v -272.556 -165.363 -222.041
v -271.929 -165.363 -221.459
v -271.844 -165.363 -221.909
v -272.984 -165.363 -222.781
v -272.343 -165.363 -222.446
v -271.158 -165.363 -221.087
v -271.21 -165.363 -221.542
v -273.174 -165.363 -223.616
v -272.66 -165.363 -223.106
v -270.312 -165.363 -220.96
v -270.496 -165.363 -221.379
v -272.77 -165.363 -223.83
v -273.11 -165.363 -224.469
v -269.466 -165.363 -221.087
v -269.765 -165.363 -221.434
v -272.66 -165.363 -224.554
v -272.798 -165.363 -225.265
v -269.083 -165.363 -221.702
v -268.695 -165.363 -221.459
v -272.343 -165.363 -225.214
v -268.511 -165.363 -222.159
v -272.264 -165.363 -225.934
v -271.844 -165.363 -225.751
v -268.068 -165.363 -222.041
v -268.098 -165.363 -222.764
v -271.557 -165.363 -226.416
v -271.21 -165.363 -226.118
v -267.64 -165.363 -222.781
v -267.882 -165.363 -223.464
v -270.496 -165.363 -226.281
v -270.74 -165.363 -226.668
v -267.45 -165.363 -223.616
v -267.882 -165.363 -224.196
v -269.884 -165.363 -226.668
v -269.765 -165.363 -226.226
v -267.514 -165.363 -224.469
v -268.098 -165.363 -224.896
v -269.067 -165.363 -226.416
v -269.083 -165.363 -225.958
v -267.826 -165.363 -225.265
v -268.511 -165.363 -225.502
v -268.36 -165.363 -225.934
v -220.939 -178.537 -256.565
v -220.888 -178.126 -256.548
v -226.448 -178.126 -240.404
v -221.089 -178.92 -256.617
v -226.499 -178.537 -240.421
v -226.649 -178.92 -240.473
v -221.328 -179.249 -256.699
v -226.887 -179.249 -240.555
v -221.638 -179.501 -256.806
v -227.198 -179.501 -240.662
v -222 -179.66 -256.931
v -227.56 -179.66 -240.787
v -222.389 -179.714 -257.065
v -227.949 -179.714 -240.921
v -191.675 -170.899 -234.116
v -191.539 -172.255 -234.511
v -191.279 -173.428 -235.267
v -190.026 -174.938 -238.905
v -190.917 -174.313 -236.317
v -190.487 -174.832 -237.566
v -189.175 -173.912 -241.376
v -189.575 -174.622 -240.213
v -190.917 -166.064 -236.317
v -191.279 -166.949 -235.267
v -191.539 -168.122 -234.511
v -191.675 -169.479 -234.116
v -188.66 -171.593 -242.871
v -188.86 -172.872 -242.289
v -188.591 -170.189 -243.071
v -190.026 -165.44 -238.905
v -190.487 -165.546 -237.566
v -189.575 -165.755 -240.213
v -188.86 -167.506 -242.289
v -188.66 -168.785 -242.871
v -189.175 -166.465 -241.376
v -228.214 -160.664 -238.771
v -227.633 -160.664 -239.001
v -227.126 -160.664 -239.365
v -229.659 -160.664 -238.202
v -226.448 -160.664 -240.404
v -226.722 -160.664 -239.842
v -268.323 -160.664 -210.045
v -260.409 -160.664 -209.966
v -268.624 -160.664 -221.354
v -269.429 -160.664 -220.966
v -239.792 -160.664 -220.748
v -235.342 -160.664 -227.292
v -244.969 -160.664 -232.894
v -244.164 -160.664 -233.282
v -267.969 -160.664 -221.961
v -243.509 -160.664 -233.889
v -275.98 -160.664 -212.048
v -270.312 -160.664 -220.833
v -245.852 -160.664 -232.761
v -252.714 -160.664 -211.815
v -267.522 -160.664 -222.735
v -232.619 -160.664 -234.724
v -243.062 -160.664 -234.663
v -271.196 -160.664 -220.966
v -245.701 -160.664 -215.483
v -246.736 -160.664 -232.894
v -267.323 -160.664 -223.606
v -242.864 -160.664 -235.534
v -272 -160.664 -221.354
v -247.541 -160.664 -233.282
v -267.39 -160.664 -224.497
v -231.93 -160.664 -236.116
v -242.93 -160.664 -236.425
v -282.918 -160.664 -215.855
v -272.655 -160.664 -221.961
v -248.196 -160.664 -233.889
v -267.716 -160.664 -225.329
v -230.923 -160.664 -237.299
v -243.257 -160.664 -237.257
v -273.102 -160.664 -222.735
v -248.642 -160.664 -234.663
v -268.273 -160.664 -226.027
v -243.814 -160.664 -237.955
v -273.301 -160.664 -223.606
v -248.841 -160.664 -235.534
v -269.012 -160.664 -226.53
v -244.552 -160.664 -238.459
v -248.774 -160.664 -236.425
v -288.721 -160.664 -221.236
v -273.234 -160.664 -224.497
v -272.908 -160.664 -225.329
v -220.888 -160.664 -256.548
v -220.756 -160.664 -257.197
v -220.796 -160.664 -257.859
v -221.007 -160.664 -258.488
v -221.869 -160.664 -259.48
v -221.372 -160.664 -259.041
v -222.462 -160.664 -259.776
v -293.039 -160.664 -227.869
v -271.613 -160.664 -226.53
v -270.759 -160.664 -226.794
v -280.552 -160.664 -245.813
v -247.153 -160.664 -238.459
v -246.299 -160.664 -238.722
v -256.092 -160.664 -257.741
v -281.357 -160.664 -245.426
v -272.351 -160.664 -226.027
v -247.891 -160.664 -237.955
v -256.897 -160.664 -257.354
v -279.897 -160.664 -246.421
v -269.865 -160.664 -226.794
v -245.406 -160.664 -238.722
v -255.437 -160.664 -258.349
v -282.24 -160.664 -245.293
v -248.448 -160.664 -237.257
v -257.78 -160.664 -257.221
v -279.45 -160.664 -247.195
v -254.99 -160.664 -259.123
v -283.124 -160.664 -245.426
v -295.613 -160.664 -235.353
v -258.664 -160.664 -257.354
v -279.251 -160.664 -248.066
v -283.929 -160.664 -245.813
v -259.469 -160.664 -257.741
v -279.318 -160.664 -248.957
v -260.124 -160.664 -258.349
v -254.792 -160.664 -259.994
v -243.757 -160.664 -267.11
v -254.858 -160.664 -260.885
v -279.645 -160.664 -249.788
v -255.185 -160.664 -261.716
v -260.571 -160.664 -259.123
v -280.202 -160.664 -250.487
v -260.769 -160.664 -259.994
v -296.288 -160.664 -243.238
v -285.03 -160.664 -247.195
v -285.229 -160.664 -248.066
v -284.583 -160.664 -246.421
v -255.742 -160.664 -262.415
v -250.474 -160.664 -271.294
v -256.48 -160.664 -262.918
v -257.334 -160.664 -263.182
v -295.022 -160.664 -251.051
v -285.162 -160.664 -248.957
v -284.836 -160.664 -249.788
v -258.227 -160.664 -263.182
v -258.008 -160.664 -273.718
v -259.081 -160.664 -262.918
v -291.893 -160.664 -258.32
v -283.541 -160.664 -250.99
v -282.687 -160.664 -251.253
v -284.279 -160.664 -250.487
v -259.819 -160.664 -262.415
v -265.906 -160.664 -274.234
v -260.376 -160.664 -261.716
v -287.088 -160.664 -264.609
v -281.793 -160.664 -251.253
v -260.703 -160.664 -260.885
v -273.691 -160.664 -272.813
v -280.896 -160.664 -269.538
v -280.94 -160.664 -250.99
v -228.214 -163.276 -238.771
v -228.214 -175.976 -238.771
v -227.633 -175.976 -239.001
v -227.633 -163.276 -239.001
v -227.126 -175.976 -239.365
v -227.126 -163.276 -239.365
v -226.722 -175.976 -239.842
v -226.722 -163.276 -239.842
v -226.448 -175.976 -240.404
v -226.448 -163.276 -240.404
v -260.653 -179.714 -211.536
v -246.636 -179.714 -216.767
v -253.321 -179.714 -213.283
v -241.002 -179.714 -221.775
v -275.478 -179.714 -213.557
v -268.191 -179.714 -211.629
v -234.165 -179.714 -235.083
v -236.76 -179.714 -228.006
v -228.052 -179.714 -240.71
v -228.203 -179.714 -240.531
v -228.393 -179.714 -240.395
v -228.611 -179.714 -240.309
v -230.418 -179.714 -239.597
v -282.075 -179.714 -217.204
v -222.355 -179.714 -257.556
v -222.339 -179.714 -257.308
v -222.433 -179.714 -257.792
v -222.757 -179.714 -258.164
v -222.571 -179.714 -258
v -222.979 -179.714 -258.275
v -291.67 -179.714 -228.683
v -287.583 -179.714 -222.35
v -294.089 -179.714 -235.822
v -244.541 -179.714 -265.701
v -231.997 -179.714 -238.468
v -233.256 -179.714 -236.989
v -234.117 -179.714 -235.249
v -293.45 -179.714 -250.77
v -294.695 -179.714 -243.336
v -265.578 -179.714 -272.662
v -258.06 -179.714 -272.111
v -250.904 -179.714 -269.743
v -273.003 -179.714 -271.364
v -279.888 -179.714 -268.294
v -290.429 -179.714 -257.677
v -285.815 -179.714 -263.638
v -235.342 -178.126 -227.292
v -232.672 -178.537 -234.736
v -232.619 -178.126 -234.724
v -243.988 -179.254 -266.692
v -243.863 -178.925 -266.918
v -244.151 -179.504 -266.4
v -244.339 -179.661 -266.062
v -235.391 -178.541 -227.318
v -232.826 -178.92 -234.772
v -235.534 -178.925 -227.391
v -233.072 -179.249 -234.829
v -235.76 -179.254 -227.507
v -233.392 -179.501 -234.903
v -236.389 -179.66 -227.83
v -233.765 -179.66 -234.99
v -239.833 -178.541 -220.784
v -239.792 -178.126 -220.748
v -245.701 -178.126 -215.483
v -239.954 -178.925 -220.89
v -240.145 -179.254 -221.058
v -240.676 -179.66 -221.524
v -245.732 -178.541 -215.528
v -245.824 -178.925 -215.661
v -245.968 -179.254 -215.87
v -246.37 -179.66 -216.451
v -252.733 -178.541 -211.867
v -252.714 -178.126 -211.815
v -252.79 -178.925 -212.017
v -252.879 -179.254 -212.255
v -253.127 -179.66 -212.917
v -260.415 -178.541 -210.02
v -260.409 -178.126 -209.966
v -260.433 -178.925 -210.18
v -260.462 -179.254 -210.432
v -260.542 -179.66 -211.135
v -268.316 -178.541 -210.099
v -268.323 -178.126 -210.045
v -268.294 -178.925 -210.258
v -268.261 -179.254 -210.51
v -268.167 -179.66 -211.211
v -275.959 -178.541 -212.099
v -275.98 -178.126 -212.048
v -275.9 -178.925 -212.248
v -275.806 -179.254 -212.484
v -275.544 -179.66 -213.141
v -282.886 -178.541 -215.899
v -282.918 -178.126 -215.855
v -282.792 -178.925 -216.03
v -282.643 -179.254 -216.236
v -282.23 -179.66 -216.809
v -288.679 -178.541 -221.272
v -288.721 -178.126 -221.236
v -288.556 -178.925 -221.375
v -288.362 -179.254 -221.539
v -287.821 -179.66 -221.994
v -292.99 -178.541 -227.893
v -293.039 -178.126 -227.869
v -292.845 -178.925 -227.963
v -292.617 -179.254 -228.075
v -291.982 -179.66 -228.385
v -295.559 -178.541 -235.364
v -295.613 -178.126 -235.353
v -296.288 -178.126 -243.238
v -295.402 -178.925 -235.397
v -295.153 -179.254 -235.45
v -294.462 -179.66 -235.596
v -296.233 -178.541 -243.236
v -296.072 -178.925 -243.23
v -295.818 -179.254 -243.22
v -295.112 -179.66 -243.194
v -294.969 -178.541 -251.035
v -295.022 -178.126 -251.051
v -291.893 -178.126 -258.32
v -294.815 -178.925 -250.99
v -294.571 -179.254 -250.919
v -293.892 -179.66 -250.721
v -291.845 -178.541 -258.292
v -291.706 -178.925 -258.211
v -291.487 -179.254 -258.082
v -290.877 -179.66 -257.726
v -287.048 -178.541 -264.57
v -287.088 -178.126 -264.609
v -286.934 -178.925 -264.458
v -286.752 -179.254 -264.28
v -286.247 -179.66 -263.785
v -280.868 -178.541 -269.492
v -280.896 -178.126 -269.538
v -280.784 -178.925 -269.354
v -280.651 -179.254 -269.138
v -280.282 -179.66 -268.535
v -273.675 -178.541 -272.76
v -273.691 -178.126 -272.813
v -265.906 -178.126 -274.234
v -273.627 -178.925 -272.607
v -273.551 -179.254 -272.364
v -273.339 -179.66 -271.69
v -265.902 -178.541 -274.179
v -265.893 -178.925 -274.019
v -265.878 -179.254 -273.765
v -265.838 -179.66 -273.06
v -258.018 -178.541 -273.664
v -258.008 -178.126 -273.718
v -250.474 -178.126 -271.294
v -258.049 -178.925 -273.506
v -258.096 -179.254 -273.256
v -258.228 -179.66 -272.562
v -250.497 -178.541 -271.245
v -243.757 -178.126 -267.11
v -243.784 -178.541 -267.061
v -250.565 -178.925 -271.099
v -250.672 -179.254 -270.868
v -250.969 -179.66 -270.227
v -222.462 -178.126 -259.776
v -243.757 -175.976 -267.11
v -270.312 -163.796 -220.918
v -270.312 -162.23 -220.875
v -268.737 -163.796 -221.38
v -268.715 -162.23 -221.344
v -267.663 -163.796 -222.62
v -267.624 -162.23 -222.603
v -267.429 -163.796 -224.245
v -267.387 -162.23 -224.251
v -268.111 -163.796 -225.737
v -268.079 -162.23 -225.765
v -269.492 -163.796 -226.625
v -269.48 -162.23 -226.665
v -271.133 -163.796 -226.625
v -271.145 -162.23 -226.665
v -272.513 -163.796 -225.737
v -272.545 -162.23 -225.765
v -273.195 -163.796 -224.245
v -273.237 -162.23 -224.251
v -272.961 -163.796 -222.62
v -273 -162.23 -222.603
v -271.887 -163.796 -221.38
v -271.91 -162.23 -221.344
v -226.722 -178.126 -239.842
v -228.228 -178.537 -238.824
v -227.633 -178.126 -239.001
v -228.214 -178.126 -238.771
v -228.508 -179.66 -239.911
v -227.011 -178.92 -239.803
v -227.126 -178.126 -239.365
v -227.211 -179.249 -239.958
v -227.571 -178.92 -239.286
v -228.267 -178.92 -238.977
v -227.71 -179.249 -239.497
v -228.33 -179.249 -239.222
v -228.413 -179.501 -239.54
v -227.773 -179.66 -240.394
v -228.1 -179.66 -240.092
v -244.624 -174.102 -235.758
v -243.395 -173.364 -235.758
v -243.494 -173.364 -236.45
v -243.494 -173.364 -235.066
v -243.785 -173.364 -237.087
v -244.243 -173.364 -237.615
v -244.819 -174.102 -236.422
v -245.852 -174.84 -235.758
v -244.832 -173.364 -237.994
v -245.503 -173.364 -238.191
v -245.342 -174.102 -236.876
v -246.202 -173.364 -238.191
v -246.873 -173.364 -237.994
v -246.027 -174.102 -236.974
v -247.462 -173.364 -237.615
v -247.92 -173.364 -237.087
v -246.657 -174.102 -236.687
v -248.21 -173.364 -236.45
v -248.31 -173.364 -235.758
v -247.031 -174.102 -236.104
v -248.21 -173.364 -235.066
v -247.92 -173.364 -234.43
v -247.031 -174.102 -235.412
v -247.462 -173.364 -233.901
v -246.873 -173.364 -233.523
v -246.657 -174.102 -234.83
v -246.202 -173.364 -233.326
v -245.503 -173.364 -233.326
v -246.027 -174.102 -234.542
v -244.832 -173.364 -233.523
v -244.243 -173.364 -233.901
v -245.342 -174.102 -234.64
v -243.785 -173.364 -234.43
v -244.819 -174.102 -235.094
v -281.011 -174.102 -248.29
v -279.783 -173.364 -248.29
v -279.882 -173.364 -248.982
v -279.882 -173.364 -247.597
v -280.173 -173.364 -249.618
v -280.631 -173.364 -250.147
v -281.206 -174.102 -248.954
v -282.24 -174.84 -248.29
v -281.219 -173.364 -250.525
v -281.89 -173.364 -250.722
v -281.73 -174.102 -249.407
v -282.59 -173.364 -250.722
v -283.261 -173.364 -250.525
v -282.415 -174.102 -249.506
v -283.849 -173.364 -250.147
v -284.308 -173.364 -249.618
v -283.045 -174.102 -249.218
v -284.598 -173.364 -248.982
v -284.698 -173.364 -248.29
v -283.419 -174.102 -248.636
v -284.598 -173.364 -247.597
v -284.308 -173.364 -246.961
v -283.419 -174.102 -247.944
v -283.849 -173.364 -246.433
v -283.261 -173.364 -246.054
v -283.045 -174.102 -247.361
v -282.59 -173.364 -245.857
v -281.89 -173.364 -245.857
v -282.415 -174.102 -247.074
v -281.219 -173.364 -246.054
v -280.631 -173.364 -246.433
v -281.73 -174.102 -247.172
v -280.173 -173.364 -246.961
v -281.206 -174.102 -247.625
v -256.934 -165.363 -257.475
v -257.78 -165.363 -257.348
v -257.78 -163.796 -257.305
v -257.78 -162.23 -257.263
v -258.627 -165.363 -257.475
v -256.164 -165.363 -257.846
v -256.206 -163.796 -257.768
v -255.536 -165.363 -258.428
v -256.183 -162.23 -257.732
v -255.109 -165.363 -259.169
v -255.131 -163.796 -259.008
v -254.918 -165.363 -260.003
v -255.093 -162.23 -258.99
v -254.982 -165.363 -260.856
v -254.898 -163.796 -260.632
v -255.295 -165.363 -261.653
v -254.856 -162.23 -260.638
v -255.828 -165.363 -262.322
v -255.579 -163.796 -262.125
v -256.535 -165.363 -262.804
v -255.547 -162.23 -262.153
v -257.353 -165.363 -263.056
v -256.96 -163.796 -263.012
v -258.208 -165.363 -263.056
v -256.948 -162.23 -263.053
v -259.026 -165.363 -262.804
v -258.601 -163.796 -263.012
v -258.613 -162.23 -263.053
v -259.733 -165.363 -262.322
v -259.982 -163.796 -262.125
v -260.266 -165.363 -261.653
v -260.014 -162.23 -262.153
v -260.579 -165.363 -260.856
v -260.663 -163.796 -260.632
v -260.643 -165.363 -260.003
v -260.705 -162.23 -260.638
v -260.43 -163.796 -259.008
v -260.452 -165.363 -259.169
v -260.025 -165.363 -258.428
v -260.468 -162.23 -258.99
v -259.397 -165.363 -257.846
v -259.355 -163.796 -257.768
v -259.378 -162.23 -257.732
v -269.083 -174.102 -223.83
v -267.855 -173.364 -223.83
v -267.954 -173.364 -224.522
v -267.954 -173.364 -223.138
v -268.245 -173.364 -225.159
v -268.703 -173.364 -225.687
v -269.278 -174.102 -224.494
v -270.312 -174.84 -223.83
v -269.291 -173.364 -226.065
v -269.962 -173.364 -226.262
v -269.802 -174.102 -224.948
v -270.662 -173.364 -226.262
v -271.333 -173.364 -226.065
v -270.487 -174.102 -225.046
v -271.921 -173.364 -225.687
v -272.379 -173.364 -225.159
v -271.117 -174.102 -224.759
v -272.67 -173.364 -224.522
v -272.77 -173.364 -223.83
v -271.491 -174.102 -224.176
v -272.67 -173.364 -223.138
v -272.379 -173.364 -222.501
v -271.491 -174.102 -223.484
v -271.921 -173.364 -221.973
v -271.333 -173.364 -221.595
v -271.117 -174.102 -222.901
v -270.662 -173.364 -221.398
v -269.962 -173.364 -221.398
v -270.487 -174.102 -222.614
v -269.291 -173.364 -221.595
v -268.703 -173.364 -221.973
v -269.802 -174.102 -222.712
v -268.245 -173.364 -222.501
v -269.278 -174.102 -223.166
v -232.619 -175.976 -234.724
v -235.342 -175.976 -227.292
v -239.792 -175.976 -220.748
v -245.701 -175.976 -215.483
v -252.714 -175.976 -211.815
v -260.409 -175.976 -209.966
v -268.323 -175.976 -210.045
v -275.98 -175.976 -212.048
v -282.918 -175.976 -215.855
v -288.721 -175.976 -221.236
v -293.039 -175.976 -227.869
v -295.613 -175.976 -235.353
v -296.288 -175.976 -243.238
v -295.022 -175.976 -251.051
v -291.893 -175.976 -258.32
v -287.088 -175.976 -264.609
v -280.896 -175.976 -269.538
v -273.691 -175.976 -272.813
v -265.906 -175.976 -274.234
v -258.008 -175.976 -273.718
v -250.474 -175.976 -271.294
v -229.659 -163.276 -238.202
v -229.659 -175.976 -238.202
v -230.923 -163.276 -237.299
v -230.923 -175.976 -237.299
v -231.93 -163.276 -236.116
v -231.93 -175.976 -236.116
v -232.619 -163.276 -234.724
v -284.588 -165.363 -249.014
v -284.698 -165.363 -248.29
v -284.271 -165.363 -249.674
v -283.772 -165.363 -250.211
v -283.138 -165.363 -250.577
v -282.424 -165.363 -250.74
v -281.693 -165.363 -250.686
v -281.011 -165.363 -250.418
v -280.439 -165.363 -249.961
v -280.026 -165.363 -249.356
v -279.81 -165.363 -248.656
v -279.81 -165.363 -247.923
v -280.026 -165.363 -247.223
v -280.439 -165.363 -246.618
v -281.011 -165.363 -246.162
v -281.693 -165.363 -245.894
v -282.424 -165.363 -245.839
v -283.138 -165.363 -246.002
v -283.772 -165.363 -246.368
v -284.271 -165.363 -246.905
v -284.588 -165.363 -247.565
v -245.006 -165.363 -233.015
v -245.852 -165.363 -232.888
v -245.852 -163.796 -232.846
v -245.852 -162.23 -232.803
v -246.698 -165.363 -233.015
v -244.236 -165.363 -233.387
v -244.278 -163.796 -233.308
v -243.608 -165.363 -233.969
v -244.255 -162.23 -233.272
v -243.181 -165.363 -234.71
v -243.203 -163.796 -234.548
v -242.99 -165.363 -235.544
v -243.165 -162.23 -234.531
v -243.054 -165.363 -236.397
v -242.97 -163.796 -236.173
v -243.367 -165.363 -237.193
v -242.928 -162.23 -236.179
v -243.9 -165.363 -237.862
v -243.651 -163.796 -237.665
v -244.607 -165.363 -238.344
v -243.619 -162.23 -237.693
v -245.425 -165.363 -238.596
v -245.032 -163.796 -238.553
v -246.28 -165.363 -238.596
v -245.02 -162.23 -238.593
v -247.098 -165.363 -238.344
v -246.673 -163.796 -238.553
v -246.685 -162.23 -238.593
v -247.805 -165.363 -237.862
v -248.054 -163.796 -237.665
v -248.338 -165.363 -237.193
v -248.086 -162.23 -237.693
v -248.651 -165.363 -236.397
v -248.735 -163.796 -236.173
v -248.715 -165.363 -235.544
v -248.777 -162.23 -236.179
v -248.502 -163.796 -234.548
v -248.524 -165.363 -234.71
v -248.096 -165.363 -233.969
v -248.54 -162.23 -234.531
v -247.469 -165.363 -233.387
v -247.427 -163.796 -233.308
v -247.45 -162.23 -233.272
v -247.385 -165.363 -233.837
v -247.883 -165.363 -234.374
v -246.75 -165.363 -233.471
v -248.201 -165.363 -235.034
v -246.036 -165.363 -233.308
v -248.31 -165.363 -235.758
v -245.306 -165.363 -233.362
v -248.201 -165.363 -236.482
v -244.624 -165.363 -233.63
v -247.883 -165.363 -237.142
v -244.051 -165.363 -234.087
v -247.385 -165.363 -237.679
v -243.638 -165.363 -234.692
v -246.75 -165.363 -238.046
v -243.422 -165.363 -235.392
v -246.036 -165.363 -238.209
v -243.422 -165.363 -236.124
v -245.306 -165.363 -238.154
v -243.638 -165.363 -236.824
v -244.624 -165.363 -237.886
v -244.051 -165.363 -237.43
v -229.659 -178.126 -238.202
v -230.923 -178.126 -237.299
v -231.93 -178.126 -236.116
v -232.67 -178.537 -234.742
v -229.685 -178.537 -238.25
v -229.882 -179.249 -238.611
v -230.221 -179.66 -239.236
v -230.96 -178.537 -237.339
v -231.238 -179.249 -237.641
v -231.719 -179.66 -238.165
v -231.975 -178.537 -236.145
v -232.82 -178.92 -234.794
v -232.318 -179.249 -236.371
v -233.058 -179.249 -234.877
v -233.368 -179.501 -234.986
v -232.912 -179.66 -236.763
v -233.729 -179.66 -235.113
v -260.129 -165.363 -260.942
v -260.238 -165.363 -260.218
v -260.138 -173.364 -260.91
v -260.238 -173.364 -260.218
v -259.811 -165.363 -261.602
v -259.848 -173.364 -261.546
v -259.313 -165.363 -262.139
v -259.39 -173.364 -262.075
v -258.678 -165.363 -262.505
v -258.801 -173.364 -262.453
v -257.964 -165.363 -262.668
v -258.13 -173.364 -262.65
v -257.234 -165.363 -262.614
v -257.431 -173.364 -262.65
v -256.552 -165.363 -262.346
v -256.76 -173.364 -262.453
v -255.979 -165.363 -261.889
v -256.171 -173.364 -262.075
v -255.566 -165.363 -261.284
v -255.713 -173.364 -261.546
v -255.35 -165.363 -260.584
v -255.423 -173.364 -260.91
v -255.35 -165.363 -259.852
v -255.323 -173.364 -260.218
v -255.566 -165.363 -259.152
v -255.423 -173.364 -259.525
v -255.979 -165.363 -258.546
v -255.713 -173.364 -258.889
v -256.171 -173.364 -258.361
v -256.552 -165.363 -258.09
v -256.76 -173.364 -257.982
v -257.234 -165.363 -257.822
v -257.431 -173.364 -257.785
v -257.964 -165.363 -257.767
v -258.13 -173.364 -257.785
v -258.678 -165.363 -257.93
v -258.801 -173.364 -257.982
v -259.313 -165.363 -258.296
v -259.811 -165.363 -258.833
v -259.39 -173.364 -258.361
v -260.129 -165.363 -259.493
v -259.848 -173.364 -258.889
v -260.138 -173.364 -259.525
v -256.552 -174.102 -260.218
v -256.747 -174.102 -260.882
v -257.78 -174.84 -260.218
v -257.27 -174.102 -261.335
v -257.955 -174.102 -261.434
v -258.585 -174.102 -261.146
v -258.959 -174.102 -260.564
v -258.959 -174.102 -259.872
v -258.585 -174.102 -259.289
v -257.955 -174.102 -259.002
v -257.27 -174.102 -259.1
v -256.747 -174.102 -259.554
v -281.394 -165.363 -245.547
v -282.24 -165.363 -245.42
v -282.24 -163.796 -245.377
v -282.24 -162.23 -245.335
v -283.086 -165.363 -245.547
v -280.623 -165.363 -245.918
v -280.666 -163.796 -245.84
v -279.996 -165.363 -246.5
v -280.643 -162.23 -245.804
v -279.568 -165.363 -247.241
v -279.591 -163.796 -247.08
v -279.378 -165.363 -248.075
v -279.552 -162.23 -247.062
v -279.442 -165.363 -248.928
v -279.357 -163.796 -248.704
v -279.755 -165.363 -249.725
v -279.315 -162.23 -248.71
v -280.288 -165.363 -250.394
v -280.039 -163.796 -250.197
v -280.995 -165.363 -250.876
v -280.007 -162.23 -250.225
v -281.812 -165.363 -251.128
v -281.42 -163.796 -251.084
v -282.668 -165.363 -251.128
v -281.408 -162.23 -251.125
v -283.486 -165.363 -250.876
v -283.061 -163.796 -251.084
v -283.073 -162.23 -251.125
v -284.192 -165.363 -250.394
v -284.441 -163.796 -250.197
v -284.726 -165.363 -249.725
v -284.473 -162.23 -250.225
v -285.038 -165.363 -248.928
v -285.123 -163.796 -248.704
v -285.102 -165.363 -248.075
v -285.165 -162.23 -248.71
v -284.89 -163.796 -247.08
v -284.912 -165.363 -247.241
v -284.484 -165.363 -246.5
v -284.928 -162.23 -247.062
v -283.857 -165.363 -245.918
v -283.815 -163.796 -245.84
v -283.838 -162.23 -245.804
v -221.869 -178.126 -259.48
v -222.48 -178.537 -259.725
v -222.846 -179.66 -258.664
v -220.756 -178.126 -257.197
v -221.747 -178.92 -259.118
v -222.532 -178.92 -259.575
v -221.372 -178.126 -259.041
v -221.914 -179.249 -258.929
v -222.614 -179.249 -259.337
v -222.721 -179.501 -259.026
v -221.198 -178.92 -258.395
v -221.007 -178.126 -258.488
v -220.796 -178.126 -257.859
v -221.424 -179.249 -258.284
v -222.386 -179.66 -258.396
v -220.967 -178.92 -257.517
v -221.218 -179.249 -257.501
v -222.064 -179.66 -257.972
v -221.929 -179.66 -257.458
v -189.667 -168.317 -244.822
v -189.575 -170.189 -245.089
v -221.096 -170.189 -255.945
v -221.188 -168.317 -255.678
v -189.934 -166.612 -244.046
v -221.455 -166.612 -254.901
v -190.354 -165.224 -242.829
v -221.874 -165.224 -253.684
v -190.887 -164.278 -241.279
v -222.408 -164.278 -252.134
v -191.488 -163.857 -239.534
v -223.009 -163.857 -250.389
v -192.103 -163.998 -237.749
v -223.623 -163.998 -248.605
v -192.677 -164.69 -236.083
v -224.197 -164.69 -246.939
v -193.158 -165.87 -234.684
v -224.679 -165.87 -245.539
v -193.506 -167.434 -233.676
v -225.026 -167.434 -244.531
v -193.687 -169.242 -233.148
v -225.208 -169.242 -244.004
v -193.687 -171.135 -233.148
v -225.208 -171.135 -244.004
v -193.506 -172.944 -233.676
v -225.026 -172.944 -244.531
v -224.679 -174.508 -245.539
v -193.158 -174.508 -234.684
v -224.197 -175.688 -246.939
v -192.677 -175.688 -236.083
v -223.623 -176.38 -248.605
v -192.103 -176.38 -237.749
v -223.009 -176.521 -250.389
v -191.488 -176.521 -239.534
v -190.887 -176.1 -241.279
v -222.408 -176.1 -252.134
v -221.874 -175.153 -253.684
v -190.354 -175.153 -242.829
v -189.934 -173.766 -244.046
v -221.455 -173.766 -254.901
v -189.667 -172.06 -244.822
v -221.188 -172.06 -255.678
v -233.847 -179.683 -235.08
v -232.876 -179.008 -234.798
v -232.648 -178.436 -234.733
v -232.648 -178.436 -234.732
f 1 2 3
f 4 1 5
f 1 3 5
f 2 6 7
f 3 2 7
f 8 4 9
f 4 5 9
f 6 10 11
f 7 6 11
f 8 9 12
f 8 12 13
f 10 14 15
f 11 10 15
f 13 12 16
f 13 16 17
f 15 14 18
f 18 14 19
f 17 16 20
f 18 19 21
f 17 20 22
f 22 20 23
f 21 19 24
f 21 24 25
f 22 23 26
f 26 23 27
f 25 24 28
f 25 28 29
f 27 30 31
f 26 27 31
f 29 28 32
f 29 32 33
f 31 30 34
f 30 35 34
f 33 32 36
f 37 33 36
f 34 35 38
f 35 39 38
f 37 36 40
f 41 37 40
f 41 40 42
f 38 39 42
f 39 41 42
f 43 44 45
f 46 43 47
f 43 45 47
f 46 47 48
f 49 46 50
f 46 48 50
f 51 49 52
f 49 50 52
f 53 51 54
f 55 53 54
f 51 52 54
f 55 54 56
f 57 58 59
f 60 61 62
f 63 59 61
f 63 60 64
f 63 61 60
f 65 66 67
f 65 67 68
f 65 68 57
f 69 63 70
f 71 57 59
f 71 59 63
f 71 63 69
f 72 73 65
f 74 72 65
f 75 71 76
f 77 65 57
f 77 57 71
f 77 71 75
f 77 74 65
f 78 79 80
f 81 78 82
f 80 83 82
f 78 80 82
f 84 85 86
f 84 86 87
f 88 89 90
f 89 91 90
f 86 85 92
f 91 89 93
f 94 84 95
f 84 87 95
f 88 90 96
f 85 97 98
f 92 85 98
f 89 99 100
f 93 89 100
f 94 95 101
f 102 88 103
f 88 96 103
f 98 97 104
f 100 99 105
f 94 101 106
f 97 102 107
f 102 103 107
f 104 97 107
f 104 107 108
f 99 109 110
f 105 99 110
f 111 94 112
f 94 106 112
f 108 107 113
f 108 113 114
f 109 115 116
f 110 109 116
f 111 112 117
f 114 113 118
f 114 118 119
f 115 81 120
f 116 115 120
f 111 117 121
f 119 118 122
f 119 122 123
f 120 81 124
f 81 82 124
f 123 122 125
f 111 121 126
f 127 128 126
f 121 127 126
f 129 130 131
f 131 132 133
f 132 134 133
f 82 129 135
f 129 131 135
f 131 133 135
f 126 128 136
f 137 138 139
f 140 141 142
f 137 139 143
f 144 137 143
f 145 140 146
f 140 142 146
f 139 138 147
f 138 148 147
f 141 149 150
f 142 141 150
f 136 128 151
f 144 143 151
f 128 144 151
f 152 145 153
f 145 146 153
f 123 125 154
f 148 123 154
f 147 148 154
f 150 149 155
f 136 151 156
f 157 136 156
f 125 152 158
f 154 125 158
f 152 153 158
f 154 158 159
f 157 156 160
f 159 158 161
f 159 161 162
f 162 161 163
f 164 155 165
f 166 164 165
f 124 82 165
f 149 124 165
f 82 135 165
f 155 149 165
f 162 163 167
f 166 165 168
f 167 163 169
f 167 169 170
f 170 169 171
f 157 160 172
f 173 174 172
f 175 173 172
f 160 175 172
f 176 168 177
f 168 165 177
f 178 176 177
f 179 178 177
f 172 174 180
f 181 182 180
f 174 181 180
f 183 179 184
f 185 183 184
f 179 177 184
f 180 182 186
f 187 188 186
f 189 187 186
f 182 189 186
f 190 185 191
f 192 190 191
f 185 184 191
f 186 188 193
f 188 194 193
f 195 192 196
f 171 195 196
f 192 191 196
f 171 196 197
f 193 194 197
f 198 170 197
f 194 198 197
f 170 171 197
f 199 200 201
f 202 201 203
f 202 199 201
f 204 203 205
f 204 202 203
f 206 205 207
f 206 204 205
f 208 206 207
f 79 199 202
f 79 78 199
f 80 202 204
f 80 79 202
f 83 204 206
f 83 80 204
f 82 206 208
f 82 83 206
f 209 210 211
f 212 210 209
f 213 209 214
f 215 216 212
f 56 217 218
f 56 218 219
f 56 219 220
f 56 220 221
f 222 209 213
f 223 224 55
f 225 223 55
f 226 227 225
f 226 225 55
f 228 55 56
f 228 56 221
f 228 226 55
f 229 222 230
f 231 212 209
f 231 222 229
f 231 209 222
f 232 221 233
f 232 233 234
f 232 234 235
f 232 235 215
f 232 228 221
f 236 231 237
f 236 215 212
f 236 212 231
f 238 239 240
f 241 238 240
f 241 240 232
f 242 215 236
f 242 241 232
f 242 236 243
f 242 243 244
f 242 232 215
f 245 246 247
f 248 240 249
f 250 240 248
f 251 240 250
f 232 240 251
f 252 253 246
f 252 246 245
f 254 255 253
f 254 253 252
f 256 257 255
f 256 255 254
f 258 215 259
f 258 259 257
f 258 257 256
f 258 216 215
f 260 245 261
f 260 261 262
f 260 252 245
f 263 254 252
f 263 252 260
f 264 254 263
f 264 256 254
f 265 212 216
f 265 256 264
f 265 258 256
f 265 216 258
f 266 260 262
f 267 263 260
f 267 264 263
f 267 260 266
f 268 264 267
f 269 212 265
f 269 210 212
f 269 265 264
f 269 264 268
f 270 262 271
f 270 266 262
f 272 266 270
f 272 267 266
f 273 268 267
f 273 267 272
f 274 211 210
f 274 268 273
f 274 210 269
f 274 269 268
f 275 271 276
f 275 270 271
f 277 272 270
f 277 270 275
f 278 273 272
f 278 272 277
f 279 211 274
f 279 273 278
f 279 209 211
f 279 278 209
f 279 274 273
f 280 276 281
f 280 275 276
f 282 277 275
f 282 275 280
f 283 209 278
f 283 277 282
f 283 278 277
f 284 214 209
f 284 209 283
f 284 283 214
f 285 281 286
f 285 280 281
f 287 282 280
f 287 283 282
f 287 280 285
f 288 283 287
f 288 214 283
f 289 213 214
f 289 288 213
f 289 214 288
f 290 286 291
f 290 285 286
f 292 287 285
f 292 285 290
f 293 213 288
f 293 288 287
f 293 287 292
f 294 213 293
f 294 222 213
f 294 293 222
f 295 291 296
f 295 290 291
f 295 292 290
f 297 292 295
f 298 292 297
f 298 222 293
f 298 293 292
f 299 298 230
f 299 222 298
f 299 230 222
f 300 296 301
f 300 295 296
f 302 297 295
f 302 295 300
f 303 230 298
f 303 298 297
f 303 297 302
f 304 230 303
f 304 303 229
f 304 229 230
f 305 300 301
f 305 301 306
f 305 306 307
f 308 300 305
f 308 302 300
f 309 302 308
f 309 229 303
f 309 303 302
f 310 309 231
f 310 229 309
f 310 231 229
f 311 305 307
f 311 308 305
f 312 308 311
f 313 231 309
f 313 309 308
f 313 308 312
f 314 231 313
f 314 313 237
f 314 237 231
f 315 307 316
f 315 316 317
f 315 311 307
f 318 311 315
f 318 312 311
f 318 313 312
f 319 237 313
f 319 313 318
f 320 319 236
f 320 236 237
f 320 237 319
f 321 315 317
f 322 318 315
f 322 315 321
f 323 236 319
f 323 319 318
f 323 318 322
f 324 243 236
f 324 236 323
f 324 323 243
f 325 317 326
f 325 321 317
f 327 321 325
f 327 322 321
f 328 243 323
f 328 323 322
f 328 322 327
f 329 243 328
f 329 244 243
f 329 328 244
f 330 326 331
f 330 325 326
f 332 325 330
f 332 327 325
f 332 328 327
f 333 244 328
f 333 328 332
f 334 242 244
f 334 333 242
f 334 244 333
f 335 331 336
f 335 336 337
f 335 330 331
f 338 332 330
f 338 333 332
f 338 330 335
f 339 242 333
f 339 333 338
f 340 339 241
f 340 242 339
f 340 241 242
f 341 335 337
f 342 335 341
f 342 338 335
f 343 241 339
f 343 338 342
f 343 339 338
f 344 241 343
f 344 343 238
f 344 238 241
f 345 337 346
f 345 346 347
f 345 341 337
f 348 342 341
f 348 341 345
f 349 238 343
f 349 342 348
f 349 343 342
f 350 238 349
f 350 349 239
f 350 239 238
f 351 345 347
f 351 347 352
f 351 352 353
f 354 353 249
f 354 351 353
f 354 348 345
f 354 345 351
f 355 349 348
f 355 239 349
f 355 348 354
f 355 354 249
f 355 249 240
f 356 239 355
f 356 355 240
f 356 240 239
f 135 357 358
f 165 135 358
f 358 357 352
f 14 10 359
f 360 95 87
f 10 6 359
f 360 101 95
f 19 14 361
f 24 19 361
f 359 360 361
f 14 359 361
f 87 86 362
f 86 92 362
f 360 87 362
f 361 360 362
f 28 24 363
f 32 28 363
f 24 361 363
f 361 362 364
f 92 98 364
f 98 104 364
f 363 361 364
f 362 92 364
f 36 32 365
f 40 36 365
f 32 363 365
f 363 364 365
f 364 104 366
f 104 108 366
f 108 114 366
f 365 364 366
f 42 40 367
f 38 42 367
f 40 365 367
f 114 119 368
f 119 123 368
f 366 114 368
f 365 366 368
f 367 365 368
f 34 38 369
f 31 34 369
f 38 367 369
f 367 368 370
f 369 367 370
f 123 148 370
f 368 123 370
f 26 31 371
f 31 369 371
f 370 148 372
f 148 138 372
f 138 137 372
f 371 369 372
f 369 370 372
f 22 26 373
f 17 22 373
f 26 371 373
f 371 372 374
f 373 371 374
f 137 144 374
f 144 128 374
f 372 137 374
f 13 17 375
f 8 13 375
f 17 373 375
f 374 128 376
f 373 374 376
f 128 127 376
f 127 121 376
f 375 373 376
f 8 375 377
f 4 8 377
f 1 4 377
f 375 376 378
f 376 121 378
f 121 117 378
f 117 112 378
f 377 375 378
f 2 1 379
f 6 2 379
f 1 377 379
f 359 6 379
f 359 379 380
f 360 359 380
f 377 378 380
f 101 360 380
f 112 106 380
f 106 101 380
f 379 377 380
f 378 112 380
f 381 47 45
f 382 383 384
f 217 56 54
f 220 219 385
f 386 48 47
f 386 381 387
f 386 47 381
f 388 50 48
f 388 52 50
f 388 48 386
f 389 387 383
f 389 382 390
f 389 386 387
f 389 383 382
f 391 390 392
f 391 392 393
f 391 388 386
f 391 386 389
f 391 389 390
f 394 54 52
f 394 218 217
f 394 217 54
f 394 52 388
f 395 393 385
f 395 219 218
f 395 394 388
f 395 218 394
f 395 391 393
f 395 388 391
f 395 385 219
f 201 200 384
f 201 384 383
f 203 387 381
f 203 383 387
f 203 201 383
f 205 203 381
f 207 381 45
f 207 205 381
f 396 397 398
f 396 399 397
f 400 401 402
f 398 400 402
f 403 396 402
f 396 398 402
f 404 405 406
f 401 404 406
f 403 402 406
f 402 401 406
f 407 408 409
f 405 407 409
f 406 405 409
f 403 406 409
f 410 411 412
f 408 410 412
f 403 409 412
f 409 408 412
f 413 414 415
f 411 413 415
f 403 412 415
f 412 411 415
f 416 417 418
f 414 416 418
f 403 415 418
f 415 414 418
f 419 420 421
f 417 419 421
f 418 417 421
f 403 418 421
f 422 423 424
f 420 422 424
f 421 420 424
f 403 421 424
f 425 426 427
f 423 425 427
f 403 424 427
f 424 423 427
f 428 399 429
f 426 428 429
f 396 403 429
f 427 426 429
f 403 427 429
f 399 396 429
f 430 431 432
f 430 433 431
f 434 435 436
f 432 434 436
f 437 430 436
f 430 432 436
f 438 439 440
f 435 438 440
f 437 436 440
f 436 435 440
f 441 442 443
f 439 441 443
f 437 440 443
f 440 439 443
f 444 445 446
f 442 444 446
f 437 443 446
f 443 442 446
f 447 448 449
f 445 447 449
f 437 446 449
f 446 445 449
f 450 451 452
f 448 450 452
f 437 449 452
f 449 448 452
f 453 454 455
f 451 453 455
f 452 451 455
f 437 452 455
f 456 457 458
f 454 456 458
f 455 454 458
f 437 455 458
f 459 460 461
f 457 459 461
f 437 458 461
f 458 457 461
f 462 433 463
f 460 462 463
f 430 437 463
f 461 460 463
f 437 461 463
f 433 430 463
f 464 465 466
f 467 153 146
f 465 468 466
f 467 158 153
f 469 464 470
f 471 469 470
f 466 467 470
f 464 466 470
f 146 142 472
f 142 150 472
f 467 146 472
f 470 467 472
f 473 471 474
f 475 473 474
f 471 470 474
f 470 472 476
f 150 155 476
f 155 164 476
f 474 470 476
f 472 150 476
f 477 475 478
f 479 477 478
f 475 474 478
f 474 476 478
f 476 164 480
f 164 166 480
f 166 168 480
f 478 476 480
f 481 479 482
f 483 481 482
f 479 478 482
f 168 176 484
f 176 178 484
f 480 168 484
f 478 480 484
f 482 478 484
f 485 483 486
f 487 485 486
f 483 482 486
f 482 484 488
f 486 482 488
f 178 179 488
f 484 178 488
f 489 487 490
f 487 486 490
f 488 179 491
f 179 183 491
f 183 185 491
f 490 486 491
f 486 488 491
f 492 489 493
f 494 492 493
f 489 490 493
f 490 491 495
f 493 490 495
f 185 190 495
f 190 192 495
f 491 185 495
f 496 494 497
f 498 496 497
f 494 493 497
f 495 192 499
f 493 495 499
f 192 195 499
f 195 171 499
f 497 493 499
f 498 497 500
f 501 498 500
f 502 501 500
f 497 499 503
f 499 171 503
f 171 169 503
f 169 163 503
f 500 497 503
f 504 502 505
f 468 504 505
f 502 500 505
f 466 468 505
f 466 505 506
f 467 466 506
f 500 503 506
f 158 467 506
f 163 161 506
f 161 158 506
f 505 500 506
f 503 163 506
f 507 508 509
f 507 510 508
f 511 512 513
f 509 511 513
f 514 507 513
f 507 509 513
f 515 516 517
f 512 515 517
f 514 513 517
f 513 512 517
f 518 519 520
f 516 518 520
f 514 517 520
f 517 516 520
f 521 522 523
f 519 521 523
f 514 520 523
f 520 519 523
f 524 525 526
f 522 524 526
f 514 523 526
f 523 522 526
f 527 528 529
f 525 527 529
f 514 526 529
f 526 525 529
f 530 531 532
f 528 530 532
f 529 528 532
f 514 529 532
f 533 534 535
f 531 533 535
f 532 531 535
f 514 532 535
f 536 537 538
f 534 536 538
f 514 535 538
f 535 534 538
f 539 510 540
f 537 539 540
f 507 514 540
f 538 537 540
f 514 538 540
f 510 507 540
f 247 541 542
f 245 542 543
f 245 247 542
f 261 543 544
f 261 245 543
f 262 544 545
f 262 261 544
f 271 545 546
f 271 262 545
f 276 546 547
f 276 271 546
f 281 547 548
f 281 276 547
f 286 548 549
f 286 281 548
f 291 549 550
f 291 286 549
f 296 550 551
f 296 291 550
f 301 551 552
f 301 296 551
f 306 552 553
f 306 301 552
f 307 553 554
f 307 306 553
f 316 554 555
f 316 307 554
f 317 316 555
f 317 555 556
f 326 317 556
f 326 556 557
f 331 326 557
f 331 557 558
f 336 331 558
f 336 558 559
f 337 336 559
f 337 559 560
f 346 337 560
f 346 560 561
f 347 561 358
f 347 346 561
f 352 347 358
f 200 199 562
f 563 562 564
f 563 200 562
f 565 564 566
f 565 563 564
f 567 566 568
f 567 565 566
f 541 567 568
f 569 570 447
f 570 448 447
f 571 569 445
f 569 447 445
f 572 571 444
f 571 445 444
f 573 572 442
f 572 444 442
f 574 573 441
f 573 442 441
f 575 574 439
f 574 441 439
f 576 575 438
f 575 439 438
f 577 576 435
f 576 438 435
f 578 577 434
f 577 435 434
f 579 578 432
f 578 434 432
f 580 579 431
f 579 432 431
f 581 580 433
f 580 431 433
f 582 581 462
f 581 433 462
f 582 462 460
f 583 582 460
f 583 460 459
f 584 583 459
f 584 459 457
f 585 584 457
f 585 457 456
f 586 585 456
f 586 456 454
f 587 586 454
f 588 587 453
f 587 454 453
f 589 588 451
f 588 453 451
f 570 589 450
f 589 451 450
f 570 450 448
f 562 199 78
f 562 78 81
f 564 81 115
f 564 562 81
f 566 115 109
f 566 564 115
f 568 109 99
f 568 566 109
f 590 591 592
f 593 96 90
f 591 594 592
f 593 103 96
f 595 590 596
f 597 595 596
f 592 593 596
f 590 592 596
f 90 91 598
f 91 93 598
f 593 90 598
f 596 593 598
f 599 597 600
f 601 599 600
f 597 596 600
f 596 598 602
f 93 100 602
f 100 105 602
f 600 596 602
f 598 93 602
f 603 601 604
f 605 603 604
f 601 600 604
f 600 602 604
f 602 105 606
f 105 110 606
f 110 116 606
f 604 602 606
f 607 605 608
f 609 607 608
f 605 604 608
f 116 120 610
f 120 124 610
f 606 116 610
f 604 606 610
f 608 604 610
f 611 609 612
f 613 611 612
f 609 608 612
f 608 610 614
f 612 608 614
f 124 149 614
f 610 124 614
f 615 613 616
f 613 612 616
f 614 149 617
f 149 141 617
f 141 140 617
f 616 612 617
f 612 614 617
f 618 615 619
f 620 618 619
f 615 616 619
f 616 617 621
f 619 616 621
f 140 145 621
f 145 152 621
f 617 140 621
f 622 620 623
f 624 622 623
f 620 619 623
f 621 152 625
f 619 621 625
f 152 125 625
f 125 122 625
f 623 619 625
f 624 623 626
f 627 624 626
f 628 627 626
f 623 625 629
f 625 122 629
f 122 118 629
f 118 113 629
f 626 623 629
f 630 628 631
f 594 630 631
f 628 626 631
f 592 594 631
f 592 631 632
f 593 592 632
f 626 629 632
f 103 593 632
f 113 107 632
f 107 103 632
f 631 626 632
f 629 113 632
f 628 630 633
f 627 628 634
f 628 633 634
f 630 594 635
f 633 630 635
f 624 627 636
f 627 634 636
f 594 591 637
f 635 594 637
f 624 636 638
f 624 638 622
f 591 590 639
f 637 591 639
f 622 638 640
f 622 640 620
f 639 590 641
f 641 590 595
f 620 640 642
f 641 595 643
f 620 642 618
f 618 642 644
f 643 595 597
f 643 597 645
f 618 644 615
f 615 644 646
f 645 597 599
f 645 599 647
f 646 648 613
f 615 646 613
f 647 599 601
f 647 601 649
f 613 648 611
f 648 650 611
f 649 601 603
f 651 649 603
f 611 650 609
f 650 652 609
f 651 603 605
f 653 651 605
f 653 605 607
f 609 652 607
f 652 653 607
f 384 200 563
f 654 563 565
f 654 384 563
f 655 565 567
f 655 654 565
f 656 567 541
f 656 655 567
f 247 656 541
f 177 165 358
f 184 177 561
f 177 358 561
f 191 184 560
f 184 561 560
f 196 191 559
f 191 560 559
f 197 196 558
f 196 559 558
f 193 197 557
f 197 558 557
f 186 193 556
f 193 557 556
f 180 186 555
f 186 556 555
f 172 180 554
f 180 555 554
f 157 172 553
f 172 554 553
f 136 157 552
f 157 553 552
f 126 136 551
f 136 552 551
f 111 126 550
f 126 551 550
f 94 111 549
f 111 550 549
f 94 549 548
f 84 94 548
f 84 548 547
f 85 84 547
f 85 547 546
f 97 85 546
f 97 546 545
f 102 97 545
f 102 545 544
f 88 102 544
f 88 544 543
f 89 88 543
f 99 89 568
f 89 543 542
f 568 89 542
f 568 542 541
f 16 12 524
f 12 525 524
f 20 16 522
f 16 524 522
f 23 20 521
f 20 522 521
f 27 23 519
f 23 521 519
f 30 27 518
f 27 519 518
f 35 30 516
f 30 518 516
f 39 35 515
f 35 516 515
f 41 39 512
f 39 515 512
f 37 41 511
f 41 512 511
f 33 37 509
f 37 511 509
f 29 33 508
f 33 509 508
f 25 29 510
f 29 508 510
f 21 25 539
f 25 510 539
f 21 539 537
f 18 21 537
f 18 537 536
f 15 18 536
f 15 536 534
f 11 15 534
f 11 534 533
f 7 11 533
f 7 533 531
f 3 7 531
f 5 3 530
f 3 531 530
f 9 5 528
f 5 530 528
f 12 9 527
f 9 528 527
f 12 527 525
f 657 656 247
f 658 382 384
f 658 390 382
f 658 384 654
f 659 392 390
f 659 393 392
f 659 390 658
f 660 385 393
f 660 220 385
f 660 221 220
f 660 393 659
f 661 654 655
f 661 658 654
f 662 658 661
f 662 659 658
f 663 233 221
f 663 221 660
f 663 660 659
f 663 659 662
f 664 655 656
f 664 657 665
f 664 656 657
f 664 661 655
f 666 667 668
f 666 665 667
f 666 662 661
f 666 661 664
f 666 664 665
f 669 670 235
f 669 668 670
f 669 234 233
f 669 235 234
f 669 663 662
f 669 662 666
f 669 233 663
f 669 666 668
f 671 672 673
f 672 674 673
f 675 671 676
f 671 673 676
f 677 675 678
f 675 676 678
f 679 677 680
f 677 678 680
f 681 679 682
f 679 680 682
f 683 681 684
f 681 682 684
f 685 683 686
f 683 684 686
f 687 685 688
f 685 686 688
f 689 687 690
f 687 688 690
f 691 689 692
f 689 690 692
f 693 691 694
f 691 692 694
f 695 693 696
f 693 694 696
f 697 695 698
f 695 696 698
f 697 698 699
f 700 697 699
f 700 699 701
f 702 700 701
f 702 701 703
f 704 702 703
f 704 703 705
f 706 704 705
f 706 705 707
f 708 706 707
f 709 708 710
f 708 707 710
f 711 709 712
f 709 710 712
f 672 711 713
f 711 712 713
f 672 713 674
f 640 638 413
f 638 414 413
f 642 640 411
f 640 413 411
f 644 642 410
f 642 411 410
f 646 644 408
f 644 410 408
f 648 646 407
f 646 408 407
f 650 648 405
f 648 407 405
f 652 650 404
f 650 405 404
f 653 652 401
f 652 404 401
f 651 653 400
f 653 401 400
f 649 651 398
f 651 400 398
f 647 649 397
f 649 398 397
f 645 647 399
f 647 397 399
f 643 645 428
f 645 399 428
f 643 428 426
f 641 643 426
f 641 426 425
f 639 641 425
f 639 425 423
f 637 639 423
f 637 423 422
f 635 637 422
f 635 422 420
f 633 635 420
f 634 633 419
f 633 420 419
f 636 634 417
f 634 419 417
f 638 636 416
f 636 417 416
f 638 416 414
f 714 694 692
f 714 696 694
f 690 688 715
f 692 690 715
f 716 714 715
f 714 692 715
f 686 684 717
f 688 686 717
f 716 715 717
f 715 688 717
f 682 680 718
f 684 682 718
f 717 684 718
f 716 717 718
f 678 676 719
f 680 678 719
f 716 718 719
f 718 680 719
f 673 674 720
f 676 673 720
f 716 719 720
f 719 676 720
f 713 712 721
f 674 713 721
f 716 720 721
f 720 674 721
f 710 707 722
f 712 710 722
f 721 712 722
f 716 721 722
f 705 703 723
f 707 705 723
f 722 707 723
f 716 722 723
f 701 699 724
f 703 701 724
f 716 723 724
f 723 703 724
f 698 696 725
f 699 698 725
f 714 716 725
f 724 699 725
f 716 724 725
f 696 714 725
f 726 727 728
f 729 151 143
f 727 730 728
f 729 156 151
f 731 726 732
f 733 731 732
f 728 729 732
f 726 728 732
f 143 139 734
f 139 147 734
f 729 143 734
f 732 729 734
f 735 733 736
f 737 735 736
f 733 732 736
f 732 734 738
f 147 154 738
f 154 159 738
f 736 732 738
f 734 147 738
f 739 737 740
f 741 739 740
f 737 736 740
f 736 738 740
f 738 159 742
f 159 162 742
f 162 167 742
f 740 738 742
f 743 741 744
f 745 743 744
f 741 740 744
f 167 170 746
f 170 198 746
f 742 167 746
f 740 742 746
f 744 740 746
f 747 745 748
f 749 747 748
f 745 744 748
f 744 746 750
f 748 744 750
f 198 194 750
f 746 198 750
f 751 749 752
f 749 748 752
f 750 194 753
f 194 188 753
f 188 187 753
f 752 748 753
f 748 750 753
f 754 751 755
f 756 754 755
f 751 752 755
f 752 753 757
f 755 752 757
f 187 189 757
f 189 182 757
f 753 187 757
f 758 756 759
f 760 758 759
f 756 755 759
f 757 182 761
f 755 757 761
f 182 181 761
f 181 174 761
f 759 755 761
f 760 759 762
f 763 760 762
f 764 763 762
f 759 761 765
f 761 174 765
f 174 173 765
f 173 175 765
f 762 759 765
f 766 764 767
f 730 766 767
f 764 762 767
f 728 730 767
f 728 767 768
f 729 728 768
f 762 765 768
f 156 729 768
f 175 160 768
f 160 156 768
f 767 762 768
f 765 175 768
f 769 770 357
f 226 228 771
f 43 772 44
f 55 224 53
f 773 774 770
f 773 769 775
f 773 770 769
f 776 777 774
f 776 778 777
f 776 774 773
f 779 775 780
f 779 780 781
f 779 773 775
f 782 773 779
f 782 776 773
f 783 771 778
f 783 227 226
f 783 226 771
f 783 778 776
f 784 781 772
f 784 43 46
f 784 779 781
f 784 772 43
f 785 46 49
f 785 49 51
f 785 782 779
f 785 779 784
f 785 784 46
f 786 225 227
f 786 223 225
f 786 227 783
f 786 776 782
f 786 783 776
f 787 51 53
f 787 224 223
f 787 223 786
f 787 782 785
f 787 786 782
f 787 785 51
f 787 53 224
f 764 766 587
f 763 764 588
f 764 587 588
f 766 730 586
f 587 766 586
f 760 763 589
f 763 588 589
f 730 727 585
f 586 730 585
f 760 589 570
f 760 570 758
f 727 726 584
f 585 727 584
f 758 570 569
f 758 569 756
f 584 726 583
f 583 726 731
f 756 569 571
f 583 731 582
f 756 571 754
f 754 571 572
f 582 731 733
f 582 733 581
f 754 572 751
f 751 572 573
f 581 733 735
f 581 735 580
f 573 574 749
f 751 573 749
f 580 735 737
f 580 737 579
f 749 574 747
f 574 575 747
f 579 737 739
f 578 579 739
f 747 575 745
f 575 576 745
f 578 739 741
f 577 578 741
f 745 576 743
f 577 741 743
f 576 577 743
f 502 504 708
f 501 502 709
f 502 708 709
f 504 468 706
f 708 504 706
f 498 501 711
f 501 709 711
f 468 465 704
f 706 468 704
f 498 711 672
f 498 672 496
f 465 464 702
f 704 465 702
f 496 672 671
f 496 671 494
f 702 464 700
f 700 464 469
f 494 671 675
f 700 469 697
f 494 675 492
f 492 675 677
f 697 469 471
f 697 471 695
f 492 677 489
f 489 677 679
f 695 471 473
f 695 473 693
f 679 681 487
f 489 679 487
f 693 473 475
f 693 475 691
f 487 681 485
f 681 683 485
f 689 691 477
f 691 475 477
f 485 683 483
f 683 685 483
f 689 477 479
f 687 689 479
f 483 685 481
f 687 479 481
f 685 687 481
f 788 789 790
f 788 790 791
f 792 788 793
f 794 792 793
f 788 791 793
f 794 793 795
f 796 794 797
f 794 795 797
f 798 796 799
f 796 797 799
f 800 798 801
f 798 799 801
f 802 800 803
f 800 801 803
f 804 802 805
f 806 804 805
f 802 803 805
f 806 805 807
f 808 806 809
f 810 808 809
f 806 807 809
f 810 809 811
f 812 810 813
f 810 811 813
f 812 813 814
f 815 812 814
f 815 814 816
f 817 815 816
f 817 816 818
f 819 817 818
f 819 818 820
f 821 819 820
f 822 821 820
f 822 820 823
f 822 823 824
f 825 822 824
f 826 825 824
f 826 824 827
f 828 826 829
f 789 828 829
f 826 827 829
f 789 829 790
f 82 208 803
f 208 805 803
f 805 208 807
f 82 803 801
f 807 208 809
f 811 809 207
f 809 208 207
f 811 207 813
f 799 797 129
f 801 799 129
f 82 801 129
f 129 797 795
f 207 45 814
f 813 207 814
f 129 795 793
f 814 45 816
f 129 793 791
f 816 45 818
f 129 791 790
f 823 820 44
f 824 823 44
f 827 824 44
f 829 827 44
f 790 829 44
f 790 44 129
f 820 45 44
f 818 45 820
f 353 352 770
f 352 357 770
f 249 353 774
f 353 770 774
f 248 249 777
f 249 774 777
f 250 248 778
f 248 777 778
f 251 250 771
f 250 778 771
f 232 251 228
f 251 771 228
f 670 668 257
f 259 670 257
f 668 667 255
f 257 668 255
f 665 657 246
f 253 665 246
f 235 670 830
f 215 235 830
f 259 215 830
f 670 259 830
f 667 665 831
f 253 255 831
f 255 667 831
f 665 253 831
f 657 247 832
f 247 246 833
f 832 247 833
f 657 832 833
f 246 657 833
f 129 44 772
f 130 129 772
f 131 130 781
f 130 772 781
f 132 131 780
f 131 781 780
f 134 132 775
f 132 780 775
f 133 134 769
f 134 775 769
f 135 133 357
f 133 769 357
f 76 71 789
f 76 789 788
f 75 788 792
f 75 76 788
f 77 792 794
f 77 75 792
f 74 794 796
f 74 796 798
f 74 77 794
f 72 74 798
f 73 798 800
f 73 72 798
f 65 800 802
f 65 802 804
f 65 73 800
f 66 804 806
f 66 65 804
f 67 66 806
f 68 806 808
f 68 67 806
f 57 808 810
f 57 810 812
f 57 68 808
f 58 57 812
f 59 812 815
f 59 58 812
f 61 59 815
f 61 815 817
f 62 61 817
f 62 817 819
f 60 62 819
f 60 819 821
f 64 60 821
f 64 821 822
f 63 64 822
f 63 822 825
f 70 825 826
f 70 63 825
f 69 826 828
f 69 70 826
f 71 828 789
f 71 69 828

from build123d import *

# Parameters (mm, degrees)
STOCK_REFERENCE_START            = -175.975505736
STOCK_REFERENCE_SEAT_1_OUTLINE_R = 32.264078684
STOCK_REFERENCE_SEAT_1_DEPTH     = 15.311729992
STOCK_REFERENCE_SEAT_1_2_DEPTH   = 12.7
BOSS_EXTRUDE3_START              = 3.738270008
BOSS_EXTRUDE3_DEPTH              = 3.738270008
BOSS_EXTRUDE1_DEPTH              = 2.611729992
SKETCH2_R                        = 6.35
BOSS_EXTRUDE2_DEPTH              = 34.925
CHAMFER1_SIZE                    = 1.5875
FILLET1_R                        = 6.35
FILLET2_R                        = 2.54
FILLET3_R                        = 1.5875
HOLE1_AT_2_COUNT                 = 2
HOLE1_AT_2_PITCH                 = 27.213140303
HOLE1_AT_3_COUNT                 = 2
HOLE1_AT_3_PITCH                 = 38.485192091
HOLE1_AT_4_COUNT                 = 2
HOLE1_AT_4_PITCH                 = 27.213140303
F_8_CLEARANCE_HOLE1_D            = 4.9149
F_8_CLEARANCE_HOLE1_DEPTH        = 12.7
F_8_CLEARANCE_HOLE1_TIP          = 1.476584928


# Read off the part's stored shape, not the designer's step: Stock-Reference Seat-1
with BuildPart() as part:
    # Stock-Reference Seat-1 outline → Stock-Reference Seat-1 (new body)
    with BuildSketch(Plane(origin=(0, 0, 0), x_dir=(1, 0, 0), z_dir=(0, 1, 0)).offset(STOCK_REFERENCE_START)):
        with Locations((-264.046286299, 242.023928087)):
            Circle(STOCK_REFERENCE_SEAT_1_OUTLINE_R)
    extrude(amount=STOCK_REFERENCE_SEAT_1_DEPTH)

    # Stock-Reference Seat-1 2 outline → Stock-Reference Seat-1 2 (add)
    with BuildSketch(Plane(origin=(0, 0, 0), x_dir=(1, 0, 0), z_dir=(0, 1, 0)).offset(STOCK_REFERENCE_START)):
        with BuildLine():
            ThreePointArc((-243.756619182, 267.109784294), (-233.536149053, 252.516892329), (-232.618762484, 234.724508918))
            Line((-232.618762484, 234.724508918), (-230.711355396, 240.263016846))
            Line((-230.711355396, 240.263016846), (-226.943146121, 238.965283021))
            Line((-226.943146121, 238.965283021), (-220.060881103, 258.949207593))
            Line((-220.060881103, 258.949207593), (-243.756619182, 267.109784294))
        make_face()
    extrude(amount=STOCK_REFERENCE_SEAT_1_2_DEPTH)

    # Sketch7 → Boss-Extrude3 (add)
    with BuildSketch(Plane.XZ.offset(175.975505736).offset(BOSS_EXTRUDE3_START)):
        with BuildLine():
            Line((-243.756619182, -267.109784294), (-220.060881103, -258.949207593))
            Line((-220.060881103, -258.949207593), (-226.943146121, -238.965283021))
            Line((-226.943146121, -238.965283021), (-230.711355396, -240.263016846))
            Line((-230.711355396, -240.263016846), (-232.618762484, -234.724508918))
            ThreePointArc((-232.618762484, -234.724508918), (-294.556423545, -231.530963846), (-243.756619182, -267.109784294))
        make_face()
    extrude(amount=-BOSS_EXTRUDE3_DEPTH)

    # Sketch1 → Boss-Extrude1 (add)
    with BuildSketch(Plane(origin=(0, -163.275505736, 0), x_dir=(1, 0, 0), z_dir=(0, 1, 0))):
        with BuildLine():
            Line((-232.618762484, 234.724508918), (-230.711355396, 240.263016846))
            Line((-230.711355396, 240.263016846), (-226.943146121, 238.965283021))
            Line((-226.943146121, 238.965283021), (-220.060881103, 258.949207593))
            Line((-220.060881103, 258.949207593), (-243.756619182, 267.109784294))
            ThreePointArc((-243.756619182, 267.109784294), (-233.536149053, 252.516892329), (-232.618762484, 234.724508918))
        make_face()
    extrude(amount=BOSS_EXTRUDE1_DEPTH)

    # Sketch2 → Boss-Extrude2 (add)
    with BuildSketch(Plane(origin=(-276.451963722, 0, -95.207308867), x_dir=(0.325620940566074, 0, -0.9455003982362278), z_dir=(0.9455003982362278, 0, 0.32562094056607405))):
        with Locations((163.652309847, -170.188775744)):
            Circle(SKETCH2_R)
    extrude(amount=BOSS_EXTRUDE2_DEPTH)

    # Chamfer1
    chamfer1_edges = [part.edges().sort_by_distance(p)[0] for p in [
        (-192.209436228, -170.188775744, -232.564394121),
    ]]
    chamfer(chamfer1_edges, length=CHAMFER1_SIZE)

    # Fillet1
    # the kernel refuses this fillet: 6.35 mm, written as the material it adds along each edge
    with BuildSketch(Plane(origin=(-230.711355396, -175.975505736, -240.263016846), x_dir=(0.9455003982389363, 0, 0.3256209405582093), z_dir=(0, 1, 0))) as fillet1_piece_1:
        with BuildLine():
            CenterArc((6.349999999, -5.893320524), FILLET1_R, 111.862223466, 68.137776529)
            Line((-1e-09, -5.893320524), (-0.127000001, -5.893320524))
            Line((-0.127000001, -5.893320524), (-0.127, 0))
            Line((-0.127, 0), (0, 0.127))
            ThreePointArc((0, 0.127), (1.992706339, 0.127), (3.938120932, 0.11786641))
            Line((3.938120932, 0.11786641), (3.985412679, 0))
        make_face()
    extrude(amount=12.7)
    with BuildSketch(Plane(origin=(-230.711355396, -179.713775744, -240.263016846), x_dir=(0.9455003982362268, 0, 0.3256209405660767), z_dir=(0, 1, 0))) as fillet1_piece_2:
        with BuildLine():
            CenterArc((6.35, -5.893320524), FILLET1_R, 111.862223465, 68.137776535)
            Line((0, -5.893320524), (-0.127, -5.893320524))
            Line((-0.127, -5.893320524), (-0.127, 0))
            Line((-0.127, 0), (0, 0.127))
            ThreePointArc((0, 0.127), (1.99270634, 0.127), (3.938120933, 0.11786641))
            Line((3.938120933, 0.11786641), (3.98541268, 0))
        make_face()
    extrude(amount=3.738270008)
    with BuildSketch(Plane(origin=(-230.711355396, -163.275505736, -240.263016846), x_dir=(0.9455003982362268, 0, 0.3256209405660767), z_dir=(0, 1, 0))) as fillet1_piece_3:
        with BuildLine():
            CenterArc((6.35, -5.893320524), FILLET1_R, 111.862223465, 68.137776535)
            Line((0, -5.893320524), (-0.127, -5.893320524))
            Line((-0.127, -5.893320524), (-0.127, 0))
            Line((-0.127, 0), (0, 0.127))
            ThreePointArc((0, 0.127), (1.99270634, 0.127), (3.938120933, 0.11786641))
            Line((3.938120933, 0.11786641), (3.98541268, 0))
        make_face()
    extrude(amount=2.611729992)

    # Fillet2
    fillet2_edges = [part.edges().sort_by_distance(p)[0] for p in [
        (-226.943146121, -169.625505736, -238.965283021),
        (-220.060881103, -169.625505736, -258.949207593),
    ]]
    fillet(fillet2_edges, radius=FILLET2_R)

    # Fillet3
    fillet3_edges = [part.edges().sort_by_distance(p)[0] for p in [
        (-233.109535648, -179.713775744, -263.443034538),
        (-294.55657248, -179.713775744, -231.531396911),
        (-223.667862866, -179.713775744, -248.475671438),
        (-230.923127248, -179.713775744, -237.298737872),
        (-227.125556964, -179.713775744, -239.36526013),
        (-221.006530266, -179.713775744, -258.488049029),
    ]]
    fillet(fillet3_edges, radius=FILLET3_R)

    # Sketch4 → Hole1 (revolve, cut)
    with BuildSketch(Plane(origin=(-245.852404075, -160.663775744, -235.758135864), x_dir=(0, 0, 1), z_dir=(1, 0, 0))):
        Polygon((0, 0), (0, 4.699), (2.8702, 4.699), (2.9972, 0), align=None)
    hole1 = revolve(axis=Axis((-245.852404075, -270.663775744, -235.758135864), (0, 1, 0)), mode=Mode.SUBTRACT)

    # Hole1 at 2: Hole1 ×2
    with Locations(*[Vector(-0.8988185183780313, 0, 0.43832096803680365) * (i * HOLE1_AT_2_PITCH) for i in range(1, HOLE1_AT_2_COUNT)]):
        add(hole1, mode=Mode.SUBTRACT)

    # Hole1 at 3: Hole1 ×2
    with Locations(*[Vector(-0.945500398236235, 0, -0.3256209405660531) * (i * HOLE1_AT_3_PITCH) for i in range(1, HOLE1_AT_3_COUNT)]):
        add(hole1, mode=Mode.SUBTRACT)

    # Hole1 at 4: Hole1 ×2
    with Locations(*[Vector(-0.4383209680367791, 0, -0.8988185183780433) * (i * HOLE1_AT_4_PITCH) for i in range(1, HOLE1_AT_4_COUNT)]):
        add(hole1, mode=Mode.SUBTRACT)

    # #8 Clearance Hole1
    with Locations(Plane(origin=(0, -160.663775744, 0), x_dir=(1, 0, 0), z_dir=(0, 1, 0))):
        with Locations((-245.852404075, 235.758135864), (-270.312078522, 223.830045863), (-282.240168523, 248.289720311), (-257.780494076, 260.217810311)):
            Hole(F_8_CLEARANCE_HOLE1_D / 2, depth=F_8_CLEARANCE_HOLE1_DEPTH)
            with Locations((0, 0, -(F_8_CLEARANCE_HOLE1_DEPTH + F_8_CLEARANCE_HOLE1_TIP / 2))):  # 118° drill point
                Cone(0, F_8_CLEARANCE_HOLE1_D / 2, F_8_CLEARANCE_HOLE1_TIP, mode=Mode.SUBTRACT)


solid = part.part
